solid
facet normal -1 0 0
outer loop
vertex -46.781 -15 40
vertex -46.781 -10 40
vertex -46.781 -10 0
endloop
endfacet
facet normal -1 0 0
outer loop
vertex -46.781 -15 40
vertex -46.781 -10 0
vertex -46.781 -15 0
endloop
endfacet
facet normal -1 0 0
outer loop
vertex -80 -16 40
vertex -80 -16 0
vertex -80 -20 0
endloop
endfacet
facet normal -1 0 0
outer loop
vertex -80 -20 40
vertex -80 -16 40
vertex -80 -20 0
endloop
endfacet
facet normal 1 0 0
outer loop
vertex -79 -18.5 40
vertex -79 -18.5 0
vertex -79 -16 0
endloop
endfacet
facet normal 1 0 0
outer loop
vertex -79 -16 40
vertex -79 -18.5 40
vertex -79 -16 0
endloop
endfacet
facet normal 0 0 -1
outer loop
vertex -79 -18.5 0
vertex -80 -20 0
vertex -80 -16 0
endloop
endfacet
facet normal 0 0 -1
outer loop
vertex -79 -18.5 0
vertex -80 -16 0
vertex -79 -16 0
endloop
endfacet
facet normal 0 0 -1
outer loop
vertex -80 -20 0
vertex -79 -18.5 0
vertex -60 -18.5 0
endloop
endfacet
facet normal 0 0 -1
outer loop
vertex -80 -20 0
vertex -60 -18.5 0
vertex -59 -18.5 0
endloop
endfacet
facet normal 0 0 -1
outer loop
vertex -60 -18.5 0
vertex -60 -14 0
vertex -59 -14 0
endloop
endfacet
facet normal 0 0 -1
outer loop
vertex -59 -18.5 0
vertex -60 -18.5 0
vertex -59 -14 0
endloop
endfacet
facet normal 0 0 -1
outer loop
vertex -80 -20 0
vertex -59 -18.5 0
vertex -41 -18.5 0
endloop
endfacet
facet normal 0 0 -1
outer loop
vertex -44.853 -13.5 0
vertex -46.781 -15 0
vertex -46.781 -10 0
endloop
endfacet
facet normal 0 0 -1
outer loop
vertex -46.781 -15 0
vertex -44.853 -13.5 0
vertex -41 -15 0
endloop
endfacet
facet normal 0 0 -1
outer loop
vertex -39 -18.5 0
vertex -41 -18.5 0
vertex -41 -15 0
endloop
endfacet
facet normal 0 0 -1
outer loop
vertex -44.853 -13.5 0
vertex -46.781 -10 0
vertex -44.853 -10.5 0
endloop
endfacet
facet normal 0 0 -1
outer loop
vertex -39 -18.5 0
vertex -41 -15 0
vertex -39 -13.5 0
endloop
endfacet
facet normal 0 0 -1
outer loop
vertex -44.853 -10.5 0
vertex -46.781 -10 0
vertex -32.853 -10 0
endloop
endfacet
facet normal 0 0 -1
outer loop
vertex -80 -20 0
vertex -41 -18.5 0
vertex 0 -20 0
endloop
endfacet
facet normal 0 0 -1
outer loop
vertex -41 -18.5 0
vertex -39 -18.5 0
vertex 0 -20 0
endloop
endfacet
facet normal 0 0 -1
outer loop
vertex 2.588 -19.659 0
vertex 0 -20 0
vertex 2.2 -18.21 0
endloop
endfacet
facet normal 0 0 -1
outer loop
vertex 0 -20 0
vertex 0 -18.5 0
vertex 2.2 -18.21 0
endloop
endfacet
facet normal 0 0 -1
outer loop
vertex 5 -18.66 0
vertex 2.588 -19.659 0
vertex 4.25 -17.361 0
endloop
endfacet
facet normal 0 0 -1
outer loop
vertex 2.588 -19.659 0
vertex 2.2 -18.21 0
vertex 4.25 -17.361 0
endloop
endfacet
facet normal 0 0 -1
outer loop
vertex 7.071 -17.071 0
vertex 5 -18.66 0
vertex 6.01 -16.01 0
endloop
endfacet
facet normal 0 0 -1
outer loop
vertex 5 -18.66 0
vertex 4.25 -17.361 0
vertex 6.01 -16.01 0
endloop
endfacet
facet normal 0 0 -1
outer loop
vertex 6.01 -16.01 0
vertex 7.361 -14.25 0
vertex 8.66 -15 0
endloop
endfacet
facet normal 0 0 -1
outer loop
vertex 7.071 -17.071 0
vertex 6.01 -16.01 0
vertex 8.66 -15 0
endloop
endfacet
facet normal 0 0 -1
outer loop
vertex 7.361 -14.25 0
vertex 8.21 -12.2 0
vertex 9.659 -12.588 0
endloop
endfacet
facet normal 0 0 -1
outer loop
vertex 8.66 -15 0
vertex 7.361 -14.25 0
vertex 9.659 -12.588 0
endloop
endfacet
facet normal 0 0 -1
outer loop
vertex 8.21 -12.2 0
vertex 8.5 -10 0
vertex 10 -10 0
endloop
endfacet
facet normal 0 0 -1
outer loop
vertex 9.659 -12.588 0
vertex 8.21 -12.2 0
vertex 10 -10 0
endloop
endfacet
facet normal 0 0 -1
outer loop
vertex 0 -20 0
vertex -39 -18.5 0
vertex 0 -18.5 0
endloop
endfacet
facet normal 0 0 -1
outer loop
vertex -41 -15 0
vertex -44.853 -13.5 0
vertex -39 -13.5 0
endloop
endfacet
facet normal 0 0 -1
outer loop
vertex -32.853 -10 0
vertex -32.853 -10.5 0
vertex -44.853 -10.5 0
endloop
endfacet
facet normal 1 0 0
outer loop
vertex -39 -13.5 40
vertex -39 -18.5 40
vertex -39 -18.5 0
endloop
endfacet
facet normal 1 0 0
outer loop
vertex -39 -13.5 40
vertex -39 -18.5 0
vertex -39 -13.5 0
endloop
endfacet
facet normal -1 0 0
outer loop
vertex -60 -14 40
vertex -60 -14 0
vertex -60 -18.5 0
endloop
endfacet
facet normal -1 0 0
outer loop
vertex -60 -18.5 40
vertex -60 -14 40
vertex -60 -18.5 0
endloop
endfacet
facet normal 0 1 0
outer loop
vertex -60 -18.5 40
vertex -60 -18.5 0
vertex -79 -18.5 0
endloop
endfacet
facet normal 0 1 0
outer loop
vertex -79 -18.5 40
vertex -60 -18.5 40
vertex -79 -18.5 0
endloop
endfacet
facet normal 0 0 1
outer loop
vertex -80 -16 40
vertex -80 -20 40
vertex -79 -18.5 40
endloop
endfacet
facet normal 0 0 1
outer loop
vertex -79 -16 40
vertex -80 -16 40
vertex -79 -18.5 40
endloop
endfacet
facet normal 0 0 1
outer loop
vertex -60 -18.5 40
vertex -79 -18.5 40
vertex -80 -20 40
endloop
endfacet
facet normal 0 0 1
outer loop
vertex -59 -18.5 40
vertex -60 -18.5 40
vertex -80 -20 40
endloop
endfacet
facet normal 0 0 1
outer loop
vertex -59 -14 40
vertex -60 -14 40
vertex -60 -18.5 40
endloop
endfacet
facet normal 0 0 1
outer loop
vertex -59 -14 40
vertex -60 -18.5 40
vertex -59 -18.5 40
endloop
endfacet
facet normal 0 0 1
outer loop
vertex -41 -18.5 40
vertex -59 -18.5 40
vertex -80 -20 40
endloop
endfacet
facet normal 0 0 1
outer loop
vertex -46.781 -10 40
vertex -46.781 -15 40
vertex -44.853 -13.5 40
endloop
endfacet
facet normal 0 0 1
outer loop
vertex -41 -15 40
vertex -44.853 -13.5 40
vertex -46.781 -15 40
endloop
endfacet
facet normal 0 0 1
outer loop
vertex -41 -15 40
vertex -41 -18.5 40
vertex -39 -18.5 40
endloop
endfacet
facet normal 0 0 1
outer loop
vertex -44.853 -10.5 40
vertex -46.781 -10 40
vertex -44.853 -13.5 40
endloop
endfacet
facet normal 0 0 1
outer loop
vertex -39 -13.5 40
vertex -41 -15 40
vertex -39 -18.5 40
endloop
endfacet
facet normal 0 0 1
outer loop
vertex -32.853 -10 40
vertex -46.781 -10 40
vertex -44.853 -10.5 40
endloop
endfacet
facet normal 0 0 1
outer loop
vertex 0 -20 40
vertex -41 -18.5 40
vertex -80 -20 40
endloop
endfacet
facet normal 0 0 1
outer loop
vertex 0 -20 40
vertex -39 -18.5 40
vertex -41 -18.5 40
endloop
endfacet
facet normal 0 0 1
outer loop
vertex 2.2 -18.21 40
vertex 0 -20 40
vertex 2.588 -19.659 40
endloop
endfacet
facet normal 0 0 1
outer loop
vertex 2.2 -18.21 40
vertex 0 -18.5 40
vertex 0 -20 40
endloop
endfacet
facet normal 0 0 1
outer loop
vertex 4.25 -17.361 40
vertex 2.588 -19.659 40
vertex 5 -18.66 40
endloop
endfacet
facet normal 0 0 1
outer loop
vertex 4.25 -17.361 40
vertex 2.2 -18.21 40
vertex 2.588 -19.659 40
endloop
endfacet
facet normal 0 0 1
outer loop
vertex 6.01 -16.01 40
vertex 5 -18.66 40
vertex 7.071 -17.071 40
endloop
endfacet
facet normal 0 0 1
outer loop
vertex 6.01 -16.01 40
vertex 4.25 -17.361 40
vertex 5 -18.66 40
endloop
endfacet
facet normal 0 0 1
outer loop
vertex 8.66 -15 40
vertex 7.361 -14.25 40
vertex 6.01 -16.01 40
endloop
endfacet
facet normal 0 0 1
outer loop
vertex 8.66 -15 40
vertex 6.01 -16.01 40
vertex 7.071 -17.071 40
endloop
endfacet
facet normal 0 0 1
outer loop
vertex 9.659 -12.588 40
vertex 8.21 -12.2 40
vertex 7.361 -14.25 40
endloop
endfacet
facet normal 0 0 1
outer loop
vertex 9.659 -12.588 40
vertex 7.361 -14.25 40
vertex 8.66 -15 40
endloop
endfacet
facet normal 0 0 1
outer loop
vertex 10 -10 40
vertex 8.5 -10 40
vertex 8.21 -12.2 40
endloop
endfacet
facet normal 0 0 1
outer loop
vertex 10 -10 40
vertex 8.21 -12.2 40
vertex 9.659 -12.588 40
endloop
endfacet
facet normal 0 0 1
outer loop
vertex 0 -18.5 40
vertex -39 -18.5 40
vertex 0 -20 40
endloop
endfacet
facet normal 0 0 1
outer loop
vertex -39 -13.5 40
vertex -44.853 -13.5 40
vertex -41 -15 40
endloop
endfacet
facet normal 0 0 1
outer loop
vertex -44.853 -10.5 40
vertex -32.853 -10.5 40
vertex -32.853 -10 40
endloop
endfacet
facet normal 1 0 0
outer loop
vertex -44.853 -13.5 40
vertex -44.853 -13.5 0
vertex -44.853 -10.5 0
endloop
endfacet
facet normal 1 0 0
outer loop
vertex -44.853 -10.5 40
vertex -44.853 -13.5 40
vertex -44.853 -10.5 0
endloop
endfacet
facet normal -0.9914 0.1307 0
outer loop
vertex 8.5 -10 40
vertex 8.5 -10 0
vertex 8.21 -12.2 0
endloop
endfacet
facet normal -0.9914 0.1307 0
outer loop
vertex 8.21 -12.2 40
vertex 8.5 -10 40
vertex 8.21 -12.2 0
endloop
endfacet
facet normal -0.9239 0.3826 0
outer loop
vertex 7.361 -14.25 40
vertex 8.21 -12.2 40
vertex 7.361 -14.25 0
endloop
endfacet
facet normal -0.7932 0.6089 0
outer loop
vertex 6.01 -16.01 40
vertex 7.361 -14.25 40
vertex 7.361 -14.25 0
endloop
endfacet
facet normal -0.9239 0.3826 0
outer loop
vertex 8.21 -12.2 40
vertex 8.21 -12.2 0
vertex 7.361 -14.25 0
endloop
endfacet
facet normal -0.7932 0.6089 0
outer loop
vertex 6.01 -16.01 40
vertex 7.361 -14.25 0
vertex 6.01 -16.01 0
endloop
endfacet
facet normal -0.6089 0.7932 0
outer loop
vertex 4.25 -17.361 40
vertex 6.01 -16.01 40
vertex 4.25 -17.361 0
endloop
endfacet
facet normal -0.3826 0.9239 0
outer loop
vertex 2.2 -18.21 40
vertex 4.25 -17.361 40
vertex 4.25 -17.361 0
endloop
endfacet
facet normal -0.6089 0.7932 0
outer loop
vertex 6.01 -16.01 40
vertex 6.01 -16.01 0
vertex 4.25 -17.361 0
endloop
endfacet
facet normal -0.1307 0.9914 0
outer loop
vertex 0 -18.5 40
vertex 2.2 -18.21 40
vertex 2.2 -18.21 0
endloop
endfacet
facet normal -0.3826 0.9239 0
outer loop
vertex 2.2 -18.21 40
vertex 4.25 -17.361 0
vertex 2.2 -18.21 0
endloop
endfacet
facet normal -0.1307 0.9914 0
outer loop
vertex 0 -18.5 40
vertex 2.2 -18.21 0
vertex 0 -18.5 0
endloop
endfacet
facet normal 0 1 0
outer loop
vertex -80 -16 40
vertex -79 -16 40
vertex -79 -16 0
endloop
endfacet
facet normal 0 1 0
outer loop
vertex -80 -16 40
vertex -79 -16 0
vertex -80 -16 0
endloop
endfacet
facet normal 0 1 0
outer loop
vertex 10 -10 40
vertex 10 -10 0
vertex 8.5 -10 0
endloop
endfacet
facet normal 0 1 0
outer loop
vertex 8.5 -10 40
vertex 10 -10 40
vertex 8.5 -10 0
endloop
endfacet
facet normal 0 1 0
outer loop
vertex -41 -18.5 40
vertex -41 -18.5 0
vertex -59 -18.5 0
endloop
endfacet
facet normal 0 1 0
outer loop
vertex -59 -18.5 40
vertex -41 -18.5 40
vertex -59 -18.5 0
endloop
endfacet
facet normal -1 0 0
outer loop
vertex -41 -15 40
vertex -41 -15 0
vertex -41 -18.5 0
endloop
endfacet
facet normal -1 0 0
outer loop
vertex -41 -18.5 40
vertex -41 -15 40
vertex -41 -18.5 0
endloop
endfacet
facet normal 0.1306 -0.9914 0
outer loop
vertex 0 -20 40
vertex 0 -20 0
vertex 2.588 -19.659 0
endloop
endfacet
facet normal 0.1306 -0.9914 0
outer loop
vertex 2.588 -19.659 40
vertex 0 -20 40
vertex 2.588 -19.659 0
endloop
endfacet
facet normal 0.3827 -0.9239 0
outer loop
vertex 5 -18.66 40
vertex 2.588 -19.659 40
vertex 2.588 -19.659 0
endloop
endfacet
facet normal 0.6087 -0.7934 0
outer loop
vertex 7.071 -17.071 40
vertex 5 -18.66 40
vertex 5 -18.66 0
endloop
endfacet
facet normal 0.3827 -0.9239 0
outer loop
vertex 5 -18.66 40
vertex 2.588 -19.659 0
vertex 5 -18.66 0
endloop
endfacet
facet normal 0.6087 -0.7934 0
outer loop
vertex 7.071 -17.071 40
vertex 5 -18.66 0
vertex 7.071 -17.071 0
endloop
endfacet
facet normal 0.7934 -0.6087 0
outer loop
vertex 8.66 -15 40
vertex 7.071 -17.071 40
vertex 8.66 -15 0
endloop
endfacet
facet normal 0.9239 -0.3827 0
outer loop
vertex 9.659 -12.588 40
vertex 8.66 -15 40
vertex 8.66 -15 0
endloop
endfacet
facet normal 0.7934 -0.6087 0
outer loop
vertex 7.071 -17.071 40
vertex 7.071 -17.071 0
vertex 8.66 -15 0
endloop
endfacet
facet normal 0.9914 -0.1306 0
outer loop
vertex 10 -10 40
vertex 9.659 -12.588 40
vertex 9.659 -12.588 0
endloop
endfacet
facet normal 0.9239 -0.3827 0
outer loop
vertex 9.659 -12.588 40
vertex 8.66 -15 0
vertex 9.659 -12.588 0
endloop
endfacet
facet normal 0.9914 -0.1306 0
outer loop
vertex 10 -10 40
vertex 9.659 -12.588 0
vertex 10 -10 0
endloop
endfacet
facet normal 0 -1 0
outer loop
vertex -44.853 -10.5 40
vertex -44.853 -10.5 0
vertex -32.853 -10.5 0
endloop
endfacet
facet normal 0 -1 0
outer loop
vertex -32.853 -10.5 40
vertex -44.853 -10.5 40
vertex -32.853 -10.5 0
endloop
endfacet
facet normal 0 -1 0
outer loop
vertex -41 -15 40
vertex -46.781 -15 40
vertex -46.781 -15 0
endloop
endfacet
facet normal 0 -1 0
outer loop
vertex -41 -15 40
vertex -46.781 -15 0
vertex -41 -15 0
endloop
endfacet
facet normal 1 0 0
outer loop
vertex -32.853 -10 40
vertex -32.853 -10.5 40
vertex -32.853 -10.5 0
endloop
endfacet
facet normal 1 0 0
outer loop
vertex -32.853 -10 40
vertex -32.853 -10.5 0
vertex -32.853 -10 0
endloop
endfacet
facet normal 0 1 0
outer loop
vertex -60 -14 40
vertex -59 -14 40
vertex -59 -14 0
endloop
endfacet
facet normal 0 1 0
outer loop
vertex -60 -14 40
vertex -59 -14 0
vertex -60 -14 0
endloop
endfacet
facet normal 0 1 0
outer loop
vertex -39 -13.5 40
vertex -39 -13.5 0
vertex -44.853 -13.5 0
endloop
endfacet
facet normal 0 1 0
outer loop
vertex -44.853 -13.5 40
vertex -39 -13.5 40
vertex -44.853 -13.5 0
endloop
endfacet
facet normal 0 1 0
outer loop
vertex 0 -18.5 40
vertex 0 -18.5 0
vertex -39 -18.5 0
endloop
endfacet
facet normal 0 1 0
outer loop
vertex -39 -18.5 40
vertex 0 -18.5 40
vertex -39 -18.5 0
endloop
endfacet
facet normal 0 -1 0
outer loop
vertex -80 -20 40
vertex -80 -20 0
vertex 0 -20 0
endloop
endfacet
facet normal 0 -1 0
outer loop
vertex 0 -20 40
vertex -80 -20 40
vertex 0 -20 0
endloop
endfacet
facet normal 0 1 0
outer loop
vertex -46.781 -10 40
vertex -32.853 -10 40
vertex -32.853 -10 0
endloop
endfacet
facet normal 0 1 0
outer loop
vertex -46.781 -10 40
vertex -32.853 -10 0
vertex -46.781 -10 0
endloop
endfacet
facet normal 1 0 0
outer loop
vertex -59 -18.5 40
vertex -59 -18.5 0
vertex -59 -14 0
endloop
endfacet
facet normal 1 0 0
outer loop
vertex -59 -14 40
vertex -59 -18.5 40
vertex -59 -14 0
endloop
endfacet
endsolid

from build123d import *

# Parameters (mm, degrees)
F1_DEPTH = 40


with BuildPart() as f1:
    # F0 (on Top) → F1 (new body)
    with BuildSketch(Plane.XY):
        with BuildLine():
            Line((-80, -20), (-0.902612, -20))
            Line((-0.902612, -20), (0, -20))
            ThreePointArc((0, -20), (7.071068, -17.071068), (10, -10))
            Line((10, -10), (8.5, -10))
            ThreePointArc((8.5, -10), (6.010408, -16.010408), (0, -18.5))
            Line((0, -18.5), (-6.213812, -18.5))
            Line((-6.213812, -18.5), (-39, -18.5))
            Line((-39, -18.5), (-39, -13.5))
            Line((-39, -13.5), (-44.853471, -13.5))
            Line((-44.853471, -13.5), (-44.853471, -10.5))
            Line((-44.853471, -10.5), (-32.853471, -10.5))
            Line((-32.853471, -10.5), (-32.853471, -10))
            Line((-32.853471, -10), (-46.780869, -10))
            Line((-46.780869, -10), (-46.780869, -15))
            Line((-46.780869, -15), (-41, -15))
            Line((-41, -15), (-41, -18.5))
            Line((-41, -18.5), (-59, -18.5))
            Line((-59, -18.5), (-59, -14))
            Line((-59, -14), (-60, -14))
            Line((-60, -14), (-60, -18.5))
            Line((-60, -18.5), (-79, -18.5))
            Line((-79, -18.5), (-79, -16))
            Line((-79, -16), (-80, -16))
            Line((-80, -16), (-80, -18.5))
            Line((-80, -18.5), (-80, -20))
        make_face()
    extrude(amount=F1_DEPTH)


solid = f1.part
